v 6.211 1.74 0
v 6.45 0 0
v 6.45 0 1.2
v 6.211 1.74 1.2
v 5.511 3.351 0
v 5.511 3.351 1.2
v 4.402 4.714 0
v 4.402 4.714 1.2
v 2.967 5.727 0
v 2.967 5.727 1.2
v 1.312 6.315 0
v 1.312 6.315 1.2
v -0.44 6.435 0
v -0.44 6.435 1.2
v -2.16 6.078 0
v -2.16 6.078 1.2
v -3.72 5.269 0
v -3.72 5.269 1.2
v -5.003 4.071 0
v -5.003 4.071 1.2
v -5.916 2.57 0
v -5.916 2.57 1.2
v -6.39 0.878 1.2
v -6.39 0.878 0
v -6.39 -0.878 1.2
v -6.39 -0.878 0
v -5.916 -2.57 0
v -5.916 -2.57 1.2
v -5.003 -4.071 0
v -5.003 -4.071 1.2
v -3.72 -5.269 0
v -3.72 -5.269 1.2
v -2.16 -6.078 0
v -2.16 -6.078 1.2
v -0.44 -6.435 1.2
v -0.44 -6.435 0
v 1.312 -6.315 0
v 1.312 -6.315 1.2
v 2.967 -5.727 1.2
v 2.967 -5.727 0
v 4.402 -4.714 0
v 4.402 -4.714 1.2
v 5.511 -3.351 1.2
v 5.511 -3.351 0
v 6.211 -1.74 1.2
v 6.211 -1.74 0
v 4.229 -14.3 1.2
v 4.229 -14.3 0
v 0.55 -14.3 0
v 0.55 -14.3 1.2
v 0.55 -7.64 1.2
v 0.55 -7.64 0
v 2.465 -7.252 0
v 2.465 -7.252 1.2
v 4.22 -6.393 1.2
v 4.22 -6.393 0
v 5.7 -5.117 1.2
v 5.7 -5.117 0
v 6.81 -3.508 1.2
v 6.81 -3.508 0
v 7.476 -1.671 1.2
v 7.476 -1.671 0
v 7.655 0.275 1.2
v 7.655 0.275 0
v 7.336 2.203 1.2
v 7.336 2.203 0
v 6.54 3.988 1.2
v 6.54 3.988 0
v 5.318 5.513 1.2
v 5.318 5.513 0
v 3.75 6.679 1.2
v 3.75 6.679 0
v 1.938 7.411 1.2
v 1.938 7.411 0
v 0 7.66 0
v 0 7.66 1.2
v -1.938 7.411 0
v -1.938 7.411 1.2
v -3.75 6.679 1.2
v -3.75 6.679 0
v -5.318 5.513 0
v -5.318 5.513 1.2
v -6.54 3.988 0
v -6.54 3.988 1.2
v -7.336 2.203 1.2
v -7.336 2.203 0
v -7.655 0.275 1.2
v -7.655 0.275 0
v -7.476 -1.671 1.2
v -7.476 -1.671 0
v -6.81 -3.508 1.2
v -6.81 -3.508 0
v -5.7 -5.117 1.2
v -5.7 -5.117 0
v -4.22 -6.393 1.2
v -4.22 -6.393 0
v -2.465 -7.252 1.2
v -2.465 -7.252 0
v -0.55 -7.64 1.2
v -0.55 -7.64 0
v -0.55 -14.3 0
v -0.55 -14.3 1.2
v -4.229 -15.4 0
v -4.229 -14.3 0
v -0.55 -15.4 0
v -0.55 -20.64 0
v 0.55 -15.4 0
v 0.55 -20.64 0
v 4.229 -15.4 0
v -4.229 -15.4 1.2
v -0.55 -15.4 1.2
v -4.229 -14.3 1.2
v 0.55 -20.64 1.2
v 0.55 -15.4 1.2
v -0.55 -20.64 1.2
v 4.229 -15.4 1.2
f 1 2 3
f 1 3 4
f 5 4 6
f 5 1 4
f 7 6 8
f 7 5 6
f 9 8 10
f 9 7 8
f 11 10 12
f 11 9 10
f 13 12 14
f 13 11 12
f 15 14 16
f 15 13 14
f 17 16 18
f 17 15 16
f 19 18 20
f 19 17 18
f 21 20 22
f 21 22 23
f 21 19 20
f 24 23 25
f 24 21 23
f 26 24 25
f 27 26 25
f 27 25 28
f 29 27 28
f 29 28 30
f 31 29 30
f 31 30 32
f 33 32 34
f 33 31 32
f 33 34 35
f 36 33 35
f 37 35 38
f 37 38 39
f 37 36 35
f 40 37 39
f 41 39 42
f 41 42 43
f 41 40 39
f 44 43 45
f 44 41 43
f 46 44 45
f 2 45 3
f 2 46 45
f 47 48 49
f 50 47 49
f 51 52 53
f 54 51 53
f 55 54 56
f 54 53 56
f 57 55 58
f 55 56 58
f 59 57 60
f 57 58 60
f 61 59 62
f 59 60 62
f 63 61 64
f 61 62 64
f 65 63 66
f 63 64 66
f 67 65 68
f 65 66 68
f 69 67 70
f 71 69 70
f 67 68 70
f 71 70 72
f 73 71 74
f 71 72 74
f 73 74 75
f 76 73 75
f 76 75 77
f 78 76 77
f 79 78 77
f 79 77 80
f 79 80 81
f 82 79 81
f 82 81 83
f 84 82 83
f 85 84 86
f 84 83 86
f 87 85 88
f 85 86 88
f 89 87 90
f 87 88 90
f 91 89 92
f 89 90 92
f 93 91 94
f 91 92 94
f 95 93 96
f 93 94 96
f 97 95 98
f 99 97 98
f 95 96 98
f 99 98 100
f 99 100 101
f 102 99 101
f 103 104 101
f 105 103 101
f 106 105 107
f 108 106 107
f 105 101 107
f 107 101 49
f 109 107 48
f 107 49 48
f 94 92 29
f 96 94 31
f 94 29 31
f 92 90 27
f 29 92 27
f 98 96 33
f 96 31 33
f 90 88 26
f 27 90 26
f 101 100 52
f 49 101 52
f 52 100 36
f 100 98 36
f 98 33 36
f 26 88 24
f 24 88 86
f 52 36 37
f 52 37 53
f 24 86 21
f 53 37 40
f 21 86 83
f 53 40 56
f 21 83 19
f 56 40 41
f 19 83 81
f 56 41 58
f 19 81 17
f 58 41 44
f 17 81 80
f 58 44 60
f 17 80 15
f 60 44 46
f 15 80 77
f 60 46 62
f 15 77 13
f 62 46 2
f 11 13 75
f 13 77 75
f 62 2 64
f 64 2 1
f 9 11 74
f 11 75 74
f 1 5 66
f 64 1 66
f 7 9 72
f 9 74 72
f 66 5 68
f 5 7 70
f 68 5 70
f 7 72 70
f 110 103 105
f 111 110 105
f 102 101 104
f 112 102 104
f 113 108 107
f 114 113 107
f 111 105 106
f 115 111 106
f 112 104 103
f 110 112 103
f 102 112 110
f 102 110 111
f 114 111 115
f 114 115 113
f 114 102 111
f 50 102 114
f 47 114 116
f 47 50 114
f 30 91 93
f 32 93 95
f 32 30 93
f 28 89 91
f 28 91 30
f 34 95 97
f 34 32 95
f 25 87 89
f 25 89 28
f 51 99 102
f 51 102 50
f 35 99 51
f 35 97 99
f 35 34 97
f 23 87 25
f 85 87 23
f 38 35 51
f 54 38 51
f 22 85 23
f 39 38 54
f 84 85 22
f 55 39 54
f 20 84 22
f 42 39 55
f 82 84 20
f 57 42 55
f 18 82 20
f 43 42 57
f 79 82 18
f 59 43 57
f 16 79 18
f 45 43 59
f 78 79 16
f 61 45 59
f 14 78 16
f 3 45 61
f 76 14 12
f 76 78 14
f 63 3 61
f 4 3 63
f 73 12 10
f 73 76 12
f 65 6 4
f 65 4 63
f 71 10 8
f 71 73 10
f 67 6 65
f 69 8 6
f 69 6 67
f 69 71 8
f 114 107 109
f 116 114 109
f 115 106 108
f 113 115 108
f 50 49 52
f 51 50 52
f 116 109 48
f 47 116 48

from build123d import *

# Parameters (mm, degrees)
F0_R     = 6.45
F1_DEPTH = 1.2


with BuildPart() as f1:
    # F0 (on Top) → F1 (new body)
    with BuildSketch(Plane.XY):
        with BuildLine():
            Line((0.55, -14.300229), (0.55, -7.640229))
            ThreePointArc((0.55, -7.640229), (0, 7.66), (-0.55, -7.640229))
            Line((-0.55, -7.640229), (-0.55, -14.300229))
            Line((-0.55, -14.300229), (-4.229019, -14.300229))
            Line((-4.229019, -14.300229), (-4.229019, -15.400229))
            Line((-4.229019, -15.400229), (-0.55, -15.400229))
            Line((-0.55, -15.400229), (-0.55, -20.640229))
            Line((-0.55, -20.640229), (0.55, -20.640229))
            Line((0.55, -20.640229), (0.55, -15.400229))
            Line((0.55, -15.400229), (4.229019, -15.400229))
            Line((4.229019, -15.400229), (4.229019, -14.300229))
            Line((4.229019, -14.300229), (0.55, -14.300229))
        make_face()
        Circle(F0_R, mode=Mode.SUBTRACT)
    extrude(amount=F1_DEPTH)


solid = f1.part
